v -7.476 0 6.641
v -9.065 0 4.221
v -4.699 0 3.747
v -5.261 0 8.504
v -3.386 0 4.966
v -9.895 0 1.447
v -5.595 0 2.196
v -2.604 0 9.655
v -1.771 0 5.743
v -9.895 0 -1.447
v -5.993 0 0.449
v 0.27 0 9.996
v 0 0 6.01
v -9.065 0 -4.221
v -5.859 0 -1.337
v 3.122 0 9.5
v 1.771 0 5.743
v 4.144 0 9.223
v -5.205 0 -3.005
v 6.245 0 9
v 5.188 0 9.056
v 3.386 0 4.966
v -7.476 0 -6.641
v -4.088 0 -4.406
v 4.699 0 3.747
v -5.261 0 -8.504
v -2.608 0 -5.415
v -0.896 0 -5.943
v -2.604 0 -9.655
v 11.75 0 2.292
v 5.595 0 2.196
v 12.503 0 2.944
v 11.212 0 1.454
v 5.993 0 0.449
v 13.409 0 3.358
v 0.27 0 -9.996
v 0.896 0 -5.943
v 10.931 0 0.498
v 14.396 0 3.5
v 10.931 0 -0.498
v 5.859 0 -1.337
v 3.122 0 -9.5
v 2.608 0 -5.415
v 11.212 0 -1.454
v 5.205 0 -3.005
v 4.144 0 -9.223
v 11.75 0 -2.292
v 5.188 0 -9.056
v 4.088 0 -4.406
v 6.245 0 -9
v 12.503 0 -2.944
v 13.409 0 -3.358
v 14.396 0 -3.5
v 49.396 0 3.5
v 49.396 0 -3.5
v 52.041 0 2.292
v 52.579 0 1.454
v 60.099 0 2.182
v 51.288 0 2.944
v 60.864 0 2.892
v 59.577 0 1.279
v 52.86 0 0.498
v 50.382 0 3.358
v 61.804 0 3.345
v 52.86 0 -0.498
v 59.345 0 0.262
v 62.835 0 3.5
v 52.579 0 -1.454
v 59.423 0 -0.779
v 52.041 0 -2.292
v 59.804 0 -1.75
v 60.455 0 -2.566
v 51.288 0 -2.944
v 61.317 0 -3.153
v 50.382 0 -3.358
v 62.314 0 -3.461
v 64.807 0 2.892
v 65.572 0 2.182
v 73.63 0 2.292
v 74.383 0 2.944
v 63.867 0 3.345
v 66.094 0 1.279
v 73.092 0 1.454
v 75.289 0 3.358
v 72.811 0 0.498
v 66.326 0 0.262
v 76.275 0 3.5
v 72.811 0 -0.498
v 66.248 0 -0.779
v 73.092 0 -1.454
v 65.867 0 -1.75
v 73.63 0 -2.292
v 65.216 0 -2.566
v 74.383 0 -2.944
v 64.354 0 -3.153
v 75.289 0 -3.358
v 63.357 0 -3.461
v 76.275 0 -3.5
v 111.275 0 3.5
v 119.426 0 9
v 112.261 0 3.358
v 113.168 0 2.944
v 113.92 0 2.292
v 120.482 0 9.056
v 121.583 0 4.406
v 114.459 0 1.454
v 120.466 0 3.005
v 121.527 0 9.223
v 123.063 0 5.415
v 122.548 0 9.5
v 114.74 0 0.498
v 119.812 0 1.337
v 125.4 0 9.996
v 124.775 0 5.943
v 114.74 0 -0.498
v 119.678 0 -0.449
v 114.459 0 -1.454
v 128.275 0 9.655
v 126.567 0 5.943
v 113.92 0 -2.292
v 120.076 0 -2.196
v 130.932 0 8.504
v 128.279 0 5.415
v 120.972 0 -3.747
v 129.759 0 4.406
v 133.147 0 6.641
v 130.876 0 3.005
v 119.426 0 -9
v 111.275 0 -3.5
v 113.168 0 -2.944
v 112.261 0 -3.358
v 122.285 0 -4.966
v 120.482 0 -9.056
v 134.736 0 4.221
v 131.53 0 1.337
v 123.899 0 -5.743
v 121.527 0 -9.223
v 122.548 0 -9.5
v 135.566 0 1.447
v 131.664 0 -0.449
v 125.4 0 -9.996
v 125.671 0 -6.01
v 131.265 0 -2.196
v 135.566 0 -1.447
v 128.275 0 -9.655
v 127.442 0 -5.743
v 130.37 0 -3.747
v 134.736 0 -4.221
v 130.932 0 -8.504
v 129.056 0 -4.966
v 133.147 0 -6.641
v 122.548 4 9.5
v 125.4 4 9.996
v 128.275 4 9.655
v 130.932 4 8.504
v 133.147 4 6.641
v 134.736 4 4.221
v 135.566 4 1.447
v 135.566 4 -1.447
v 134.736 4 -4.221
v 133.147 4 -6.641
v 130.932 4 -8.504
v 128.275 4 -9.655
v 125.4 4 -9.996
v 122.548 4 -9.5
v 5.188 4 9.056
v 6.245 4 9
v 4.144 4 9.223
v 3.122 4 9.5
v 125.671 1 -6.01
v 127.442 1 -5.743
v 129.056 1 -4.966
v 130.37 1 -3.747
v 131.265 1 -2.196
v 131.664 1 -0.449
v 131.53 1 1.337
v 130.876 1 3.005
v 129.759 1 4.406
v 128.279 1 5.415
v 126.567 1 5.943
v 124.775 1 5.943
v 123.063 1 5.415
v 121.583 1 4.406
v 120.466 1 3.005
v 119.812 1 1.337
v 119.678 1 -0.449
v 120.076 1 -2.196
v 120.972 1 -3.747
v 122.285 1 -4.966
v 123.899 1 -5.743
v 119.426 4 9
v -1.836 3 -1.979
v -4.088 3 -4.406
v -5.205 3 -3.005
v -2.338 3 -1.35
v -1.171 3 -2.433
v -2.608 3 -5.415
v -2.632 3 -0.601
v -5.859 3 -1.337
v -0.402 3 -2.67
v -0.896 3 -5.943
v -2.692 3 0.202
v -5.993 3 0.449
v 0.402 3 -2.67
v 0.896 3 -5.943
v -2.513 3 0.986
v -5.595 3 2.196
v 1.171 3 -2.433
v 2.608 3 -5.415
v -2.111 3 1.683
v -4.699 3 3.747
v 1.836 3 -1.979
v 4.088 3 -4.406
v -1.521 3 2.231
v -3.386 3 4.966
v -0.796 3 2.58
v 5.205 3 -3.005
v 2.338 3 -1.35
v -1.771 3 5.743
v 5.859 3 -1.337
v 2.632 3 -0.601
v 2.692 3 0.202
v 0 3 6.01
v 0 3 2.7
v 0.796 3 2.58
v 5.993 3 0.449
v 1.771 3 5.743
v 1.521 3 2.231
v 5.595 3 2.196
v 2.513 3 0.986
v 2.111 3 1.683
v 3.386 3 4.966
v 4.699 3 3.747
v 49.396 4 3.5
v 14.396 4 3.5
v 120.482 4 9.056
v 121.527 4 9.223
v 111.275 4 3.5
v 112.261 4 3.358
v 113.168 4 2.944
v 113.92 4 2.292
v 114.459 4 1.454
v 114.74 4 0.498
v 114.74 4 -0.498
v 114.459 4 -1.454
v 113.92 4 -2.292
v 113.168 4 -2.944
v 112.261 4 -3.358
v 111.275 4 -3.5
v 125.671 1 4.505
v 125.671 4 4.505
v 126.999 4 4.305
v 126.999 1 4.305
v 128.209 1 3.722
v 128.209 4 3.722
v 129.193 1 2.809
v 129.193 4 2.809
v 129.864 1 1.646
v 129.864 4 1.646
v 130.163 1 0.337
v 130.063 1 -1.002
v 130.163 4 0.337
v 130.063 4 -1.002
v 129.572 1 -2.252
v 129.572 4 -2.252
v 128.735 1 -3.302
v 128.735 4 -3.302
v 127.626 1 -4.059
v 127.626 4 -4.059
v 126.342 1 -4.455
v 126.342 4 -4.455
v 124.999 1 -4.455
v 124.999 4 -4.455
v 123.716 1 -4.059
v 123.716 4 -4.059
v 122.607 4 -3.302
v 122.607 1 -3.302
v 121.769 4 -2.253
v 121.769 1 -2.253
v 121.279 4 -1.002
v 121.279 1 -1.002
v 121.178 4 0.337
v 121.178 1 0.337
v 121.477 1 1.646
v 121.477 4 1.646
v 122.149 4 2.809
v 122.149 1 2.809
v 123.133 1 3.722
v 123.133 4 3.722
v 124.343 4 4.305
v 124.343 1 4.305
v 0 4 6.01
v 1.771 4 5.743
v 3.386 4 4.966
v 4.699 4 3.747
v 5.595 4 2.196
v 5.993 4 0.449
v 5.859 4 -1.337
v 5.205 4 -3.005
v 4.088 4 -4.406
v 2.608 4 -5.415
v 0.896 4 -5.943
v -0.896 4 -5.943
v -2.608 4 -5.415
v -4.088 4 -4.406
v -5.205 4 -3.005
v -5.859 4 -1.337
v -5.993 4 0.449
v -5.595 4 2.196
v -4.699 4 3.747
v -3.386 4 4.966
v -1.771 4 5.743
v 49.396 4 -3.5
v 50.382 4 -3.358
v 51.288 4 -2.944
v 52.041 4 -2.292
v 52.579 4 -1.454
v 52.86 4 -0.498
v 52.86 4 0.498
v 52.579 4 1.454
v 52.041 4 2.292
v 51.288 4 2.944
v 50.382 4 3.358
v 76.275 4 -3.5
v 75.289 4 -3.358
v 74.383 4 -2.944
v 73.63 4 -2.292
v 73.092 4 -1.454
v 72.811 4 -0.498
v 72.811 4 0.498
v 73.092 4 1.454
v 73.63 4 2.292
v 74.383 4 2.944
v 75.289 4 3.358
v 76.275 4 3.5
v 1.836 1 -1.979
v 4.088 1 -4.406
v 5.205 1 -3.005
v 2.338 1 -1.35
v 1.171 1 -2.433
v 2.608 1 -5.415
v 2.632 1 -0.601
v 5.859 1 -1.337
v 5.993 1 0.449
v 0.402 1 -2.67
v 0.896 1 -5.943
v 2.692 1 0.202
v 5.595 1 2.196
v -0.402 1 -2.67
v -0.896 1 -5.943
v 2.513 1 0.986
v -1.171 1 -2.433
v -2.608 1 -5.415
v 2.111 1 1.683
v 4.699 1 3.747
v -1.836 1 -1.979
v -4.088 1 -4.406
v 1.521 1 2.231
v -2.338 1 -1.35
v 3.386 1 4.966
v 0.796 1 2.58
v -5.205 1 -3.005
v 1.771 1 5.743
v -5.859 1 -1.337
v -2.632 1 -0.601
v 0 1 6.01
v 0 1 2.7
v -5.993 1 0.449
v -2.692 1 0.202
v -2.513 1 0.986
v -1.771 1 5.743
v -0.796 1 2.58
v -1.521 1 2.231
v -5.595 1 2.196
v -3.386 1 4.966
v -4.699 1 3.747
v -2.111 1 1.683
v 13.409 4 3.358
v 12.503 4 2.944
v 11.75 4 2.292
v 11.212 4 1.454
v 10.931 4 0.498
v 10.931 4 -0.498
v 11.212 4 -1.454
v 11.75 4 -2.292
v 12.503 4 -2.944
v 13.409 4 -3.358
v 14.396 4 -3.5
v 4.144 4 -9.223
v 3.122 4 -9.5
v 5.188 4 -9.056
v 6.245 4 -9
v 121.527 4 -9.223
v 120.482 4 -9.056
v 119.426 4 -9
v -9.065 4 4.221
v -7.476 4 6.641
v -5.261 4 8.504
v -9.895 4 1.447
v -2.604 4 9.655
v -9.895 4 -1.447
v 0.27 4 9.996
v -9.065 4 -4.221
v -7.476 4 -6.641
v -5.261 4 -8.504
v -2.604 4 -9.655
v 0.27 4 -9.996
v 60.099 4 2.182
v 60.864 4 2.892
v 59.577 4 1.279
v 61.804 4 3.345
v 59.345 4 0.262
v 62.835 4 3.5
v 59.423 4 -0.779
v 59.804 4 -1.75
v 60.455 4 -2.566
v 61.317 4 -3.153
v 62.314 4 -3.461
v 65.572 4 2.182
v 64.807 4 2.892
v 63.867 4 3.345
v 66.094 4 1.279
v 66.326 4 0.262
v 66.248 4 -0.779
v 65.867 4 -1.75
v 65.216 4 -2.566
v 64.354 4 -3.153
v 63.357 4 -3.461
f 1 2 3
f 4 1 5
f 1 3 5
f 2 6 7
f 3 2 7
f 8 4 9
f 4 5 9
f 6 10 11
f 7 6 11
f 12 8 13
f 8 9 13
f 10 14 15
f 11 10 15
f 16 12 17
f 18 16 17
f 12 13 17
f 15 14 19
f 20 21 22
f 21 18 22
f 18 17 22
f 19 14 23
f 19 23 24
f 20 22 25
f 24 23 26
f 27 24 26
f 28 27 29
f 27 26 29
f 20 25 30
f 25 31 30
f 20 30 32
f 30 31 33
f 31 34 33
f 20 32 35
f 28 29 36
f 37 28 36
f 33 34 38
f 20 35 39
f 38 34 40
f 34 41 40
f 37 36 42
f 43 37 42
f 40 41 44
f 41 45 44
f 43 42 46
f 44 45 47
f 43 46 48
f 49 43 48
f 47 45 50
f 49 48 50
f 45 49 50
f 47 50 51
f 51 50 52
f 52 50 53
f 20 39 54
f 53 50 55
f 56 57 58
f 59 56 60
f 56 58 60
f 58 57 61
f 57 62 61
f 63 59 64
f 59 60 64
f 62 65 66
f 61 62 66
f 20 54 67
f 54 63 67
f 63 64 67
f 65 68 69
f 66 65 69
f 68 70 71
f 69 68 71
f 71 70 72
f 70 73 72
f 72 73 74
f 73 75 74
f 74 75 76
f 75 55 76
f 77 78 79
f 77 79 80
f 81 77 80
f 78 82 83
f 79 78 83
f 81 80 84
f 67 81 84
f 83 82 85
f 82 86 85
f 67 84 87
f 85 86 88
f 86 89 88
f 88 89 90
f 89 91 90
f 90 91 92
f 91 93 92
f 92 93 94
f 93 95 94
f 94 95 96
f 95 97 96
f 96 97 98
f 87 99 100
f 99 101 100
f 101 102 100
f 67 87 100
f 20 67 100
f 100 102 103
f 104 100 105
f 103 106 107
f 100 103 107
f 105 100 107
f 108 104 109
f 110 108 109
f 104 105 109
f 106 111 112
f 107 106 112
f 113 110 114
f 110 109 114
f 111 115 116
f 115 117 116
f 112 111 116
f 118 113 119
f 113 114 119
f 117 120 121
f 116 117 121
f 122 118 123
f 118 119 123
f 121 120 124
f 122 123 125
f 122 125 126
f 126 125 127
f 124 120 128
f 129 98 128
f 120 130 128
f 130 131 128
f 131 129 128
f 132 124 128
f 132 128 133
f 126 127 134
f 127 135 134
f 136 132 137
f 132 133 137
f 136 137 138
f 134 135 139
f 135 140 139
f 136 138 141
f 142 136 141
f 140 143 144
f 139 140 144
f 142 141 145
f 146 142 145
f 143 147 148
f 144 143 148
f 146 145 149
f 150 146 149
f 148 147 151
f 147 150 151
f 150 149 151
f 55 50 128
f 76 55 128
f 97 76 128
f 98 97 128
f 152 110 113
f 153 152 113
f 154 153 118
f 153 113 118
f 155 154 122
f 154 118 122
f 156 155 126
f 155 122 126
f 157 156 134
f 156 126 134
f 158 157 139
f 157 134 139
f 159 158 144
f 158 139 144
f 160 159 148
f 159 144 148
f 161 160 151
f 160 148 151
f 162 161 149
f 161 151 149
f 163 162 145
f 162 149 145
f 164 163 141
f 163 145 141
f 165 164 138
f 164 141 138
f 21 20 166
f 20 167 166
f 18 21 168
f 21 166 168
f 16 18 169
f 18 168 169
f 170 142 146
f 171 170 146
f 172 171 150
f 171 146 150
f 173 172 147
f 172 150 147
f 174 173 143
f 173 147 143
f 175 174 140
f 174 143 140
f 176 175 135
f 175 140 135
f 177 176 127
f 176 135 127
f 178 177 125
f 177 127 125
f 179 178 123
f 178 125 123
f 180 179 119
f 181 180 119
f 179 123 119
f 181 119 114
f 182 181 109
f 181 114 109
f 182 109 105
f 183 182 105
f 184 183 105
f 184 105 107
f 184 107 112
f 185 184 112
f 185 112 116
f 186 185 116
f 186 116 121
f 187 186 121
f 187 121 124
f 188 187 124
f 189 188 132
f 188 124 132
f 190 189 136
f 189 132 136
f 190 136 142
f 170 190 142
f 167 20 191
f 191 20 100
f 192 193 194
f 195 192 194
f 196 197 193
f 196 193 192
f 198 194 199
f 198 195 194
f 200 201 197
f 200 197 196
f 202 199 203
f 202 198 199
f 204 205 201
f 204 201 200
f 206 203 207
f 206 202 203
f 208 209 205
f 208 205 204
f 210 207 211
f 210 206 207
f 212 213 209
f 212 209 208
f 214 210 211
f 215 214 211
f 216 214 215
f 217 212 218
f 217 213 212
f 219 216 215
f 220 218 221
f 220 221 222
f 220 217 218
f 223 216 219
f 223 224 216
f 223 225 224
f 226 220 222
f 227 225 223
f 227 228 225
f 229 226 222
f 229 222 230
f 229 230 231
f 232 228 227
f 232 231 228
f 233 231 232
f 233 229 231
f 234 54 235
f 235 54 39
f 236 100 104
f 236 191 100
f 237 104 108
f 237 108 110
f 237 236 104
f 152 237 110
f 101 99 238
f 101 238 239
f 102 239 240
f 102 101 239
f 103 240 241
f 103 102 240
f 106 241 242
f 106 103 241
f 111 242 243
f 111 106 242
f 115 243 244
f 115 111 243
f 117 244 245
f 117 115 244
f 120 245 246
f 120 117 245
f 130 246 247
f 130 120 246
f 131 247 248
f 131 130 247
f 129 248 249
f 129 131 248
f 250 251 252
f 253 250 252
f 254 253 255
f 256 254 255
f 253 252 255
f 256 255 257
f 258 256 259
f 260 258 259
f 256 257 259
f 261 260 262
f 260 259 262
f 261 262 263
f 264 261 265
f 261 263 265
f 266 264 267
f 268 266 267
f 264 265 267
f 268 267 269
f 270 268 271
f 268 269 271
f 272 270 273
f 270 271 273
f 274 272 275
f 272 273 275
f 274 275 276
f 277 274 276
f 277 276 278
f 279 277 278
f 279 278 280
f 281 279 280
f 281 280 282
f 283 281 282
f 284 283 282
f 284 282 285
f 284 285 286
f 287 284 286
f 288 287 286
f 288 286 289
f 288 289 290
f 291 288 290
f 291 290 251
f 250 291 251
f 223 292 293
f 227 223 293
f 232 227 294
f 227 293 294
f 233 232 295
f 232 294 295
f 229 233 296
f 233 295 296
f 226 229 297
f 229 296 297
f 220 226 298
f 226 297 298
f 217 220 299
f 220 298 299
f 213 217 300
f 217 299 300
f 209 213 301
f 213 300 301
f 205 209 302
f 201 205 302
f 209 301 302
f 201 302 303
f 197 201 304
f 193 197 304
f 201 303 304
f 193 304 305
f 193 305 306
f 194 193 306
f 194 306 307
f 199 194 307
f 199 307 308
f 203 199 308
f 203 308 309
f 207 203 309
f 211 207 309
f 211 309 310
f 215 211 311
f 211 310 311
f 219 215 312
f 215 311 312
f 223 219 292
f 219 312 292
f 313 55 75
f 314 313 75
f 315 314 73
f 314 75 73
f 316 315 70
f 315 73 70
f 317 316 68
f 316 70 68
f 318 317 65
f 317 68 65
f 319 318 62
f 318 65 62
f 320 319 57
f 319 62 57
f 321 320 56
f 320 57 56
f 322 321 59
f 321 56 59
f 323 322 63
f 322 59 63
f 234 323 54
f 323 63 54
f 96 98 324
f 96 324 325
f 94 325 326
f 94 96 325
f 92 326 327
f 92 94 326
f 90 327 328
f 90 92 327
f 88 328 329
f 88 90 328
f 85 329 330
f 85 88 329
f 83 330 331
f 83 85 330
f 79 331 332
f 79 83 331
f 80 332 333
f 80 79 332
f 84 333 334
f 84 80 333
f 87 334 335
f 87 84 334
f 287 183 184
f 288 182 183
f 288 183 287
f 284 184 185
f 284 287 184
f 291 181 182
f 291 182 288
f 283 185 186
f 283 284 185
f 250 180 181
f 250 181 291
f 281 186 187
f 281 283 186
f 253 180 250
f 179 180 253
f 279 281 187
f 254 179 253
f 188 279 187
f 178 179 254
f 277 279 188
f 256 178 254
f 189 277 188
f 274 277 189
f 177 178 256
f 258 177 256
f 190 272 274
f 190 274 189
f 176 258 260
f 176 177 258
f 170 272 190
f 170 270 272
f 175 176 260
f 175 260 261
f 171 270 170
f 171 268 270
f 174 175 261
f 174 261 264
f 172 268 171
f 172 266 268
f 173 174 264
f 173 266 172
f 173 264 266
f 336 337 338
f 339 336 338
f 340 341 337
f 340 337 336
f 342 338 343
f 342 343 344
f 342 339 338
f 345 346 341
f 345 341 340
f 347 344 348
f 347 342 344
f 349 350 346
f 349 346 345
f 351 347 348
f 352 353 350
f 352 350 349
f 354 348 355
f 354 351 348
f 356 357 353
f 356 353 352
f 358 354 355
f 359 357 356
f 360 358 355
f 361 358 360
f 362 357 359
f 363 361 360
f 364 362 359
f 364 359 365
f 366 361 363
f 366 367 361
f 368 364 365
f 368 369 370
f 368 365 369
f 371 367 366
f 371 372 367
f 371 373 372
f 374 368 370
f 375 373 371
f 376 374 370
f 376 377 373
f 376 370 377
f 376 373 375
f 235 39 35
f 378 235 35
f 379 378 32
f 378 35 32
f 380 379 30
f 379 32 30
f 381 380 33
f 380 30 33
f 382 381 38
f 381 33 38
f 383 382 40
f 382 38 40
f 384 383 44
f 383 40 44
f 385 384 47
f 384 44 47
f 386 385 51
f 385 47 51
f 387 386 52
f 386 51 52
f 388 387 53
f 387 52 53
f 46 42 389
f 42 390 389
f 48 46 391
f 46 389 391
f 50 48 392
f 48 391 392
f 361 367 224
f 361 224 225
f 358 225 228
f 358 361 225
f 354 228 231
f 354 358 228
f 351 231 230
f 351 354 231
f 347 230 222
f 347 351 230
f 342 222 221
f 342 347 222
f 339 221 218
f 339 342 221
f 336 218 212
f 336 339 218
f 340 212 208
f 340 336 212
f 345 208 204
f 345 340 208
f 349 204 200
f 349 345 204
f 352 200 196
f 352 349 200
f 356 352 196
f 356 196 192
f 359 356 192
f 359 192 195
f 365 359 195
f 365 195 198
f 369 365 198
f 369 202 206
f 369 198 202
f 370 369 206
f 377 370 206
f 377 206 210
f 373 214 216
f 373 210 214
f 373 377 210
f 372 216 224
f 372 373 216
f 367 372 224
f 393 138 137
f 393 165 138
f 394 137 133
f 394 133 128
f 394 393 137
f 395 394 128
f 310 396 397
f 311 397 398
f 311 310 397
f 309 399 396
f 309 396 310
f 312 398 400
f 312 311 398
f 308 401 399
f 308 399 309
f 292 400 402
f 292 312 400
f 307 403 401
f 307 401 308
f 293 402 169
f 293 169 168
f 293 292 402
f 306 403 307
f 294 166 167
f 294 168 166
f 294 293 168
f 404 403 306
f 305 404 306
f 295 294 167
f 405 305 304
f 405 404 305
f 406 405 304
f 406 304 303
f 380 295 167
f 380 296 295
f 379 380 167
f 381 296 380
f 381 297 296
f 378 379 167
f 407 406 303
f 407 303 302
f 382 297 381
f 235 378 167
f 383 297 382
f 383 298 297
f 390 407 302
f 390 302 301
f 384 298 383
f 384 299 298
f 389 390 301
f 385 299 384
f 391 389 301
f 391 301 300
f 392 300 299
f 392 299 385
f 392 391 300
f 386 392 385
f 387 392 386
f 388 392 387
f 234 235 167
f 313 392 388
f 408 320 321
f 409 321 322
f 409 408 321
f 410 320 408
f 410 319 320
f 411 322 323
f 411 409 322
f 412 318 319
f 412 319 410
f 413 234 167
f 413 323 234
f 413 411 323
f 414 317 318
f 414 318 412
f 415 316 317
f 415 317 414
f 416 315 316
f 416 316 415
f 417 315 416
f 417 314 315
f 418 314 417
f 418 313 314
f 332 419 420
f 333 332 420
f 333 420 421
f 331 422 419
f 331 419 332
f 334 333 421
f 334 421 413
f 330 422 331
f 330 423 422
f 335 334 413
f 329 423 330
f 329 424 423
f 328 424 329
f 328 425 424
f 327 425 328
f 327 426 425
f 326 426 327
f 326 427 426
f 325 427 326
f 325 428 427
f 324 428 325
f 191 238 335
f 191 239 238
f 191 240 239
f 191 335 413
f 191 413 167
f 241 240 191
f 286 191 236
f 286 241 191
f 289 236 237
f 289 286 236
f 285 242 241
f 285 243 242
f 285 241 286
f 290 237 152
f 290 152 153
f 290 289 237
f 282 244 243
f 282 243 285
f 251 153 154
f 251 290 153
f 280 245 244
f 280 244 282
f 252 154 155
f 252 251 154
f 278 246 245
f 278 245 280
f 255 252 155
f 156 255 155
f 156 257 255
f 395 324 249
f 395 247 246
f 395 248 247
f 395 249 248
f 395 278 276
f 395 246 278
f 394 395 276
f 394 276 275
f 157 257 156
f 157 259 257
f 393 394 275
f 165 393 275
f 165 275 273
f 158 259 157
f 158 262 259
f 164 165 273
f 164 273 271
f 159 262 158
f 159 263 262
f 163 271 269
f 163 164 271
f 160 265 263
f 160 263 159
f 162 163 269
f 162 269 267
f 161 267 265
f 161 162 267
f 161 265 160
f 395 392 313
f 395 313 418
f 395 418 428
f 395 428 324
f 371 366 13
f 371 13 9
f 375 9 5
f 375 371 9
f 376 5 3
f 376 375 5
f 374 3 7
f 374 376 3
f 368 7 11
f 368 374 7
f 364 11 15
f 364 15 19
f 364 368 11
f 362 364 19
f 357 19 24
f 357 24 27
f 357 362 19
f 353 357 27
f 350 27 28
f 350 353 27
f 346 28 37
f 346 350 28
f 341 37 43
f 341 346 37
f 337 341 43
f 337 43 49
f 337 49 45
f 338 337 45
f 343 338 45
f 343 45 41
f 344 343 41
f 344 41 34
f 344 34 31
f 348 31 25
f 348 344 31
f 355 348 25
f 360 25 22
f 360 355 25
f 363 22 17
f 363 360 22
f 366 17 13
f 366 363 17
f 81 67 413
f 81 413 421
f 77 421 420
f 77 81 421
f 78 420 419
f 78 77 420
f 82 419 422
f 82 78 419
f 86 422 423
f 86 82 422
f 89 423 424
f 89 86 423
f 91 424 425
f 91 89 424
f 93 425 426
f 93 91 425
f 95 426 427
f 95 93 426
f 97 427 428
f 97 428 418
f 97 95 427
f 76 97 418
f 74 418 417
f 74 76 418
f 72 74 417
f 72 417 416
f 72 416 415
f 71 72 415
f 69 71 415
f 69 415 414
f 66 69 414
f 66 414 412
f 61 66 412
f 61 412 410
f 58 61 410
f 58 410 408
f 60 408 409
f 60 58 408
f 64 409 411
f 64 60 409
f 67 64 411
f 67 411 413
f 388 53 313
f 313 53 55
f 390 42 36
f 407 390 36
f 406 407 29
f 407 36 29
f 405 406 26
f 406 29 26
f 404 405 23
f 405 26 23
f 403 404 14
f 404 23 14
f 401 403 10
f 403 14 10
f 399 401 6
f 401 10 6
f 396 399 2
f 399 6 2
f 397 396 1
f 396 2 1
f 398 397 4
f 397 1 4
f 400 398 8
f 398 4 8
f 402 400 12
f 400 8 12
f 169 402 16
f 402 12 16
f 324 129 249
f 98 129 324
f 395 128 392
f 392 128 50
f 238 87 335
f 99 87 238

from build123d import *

# Parameters (mm, degrees)
SKETCH_1_R          = 2.7
SKETCH_1_R_2        = 2.5
SKETCH_1_R_3        = 3.5
EXTRUDE_1_DEPTH     = 4
SKETCH_2_R          = 6.01
CUT_EXTRUDE_1_DEPTH = 1
SKETCH_3_R          = 6.01
CUT_EXTRUDE_2_DEPTH = 1
CUT_EXTRUDE_START   = -1
SKETCH_4_R          = 6.01
CUT_EXTRUDE_3_DEPTH = 1
SKETCH_5_R          = 4.505
CUT_EXTRUDE_4_DEPTH = 137.097733658
FILLET_1_R          = 10


with BuildPart() as part:
    # 草图1 → 凸台-拉伸1 (new body)
    with BuildSketch(Plane(origin=(0, 0, 0), x_dir=(1, 0, 0), z_dir=(0, 1, 0))):
        with BuildLine():
            Line((4.358898944, -9), (121.312001056, -9))
            ThreePointArc((121.312001056, -9), (135.6709, 0), (121.312001056, 9))
            Line((121.312001056, 9), (4.358898944, 9))
            ThreePointArc((4.358898944, 9), (-10, 0), (4.358898944, -9))
        make_face()
        with Locations(Location((0, 0, 0), (0, 0, 270))):
            Circle(SKETCH_1_R, mode=Mode.SUBTRACT)
        with Locations(Location((125.6709, 0, 0), (0, 0, 270))):
            Circle(SKETCH_1_R_2, mode=Mode.SUBTRACT)
        with Locations(Location((62.83545, 0, 0), (0, 0, 270))):
            Circle(SKETCH_1_R_3, mode=Mode.SUBTRACT)
        with BuildLine():
            Line((49.395542126, -3.5), (14.395542126, -3.5))
            ThreePointArc((14.395542126, -3.5), (10.895542126, 0), (14.395542126, 3.5))
            Line((14.395542126, 3.5), (49.395542126, 3.5))
            ThreePointArc((49.395542126, 3.5), (52.895542126, 0), (49.395542126, -3.5))
        make_face(mode=Mode.SUBTRACT)
        with BuildLine():
            Line((76.275357874, -3.5), (111.275357874, -3.5))
            ThreePointArc((111.275357874, -3.5), (114.775357874, 0), (111.275357874, 3.5))
            Line((111.275357874, 3.5), (76.275357874, 3.5))
            ThreePointArc((76.275357874, 3.5), (72.775357874, 0), (76.275357874, -3.5))
        make_face(mode=Mode.SUBTRACT)
    extrude(amount=EXTRUDE_1_DEPTH)

    # 草图2 → 切除-拉伸1 (cut)
    with BuildSketch(Plane.XZ):
        with Locations(Location((125.6709, 0, 0), (0, 0, 270))):
            Circle(SKETCH_2_R)
    extrude(amount=-CUT_EXTRUDE_1_DEPTH, mode=Mode.SUBTRACT)

    # 草图3 → 切除-拉伸2 (cut)
    with BuildSketch(Plane(origin=(0, 4, 0), x_dir=(1, 0, 0), z_dir=(0, 1, 0))):
        with Locations(Location((0, 0, 0), (0, 0, 270))):
            Circle(SKETCH_3_R)
    extrude(amount=-CUT_EXTRUDE_2_DEPTH, mode=Mode.SUBTRACT)

    # 草图4 → 切除-拉伸3 (cut)
    with BuildSketch(Plane.XZ.offset(CUT_EXTRUDE_START)):
        with Locations(Location((0, 0, 0), (0, 0, 90))):
            Circle(SKETCH_4_R)
    extrude(amount=CUT_EXTRUDE_3_DEPTH, mode=Mode.SUBTRACT)

    # 草图5 → 切除-拉伸4 (cut, through all)
    with BuildSketch(Plane(origin=(0, 4, 0), x_dir=(1, 0, 0), z_dir=(0, 1, 0))):
        with Locations(Location((125.6709, 0, 0), (0, 0, 270))):
            Circle(SKETCH_5_R)
    extrude(amount=-CUT_EXTRUDE_4_DEPTH, mode=Mode.SUBTRACT)

    # 圆角1
    fillet_1_edges = [part.edges().sort_by_distance(p)[0] for p in [
        (4.358898944, 2, -9),
        (121.312001056, 2, -9),
        (121.312001056, 2, 9),
        (4.358898944, 2, 9),
    ]]
    fillet(fillet_1_edges, radius=FILLET_1_R)


solid = part.part
